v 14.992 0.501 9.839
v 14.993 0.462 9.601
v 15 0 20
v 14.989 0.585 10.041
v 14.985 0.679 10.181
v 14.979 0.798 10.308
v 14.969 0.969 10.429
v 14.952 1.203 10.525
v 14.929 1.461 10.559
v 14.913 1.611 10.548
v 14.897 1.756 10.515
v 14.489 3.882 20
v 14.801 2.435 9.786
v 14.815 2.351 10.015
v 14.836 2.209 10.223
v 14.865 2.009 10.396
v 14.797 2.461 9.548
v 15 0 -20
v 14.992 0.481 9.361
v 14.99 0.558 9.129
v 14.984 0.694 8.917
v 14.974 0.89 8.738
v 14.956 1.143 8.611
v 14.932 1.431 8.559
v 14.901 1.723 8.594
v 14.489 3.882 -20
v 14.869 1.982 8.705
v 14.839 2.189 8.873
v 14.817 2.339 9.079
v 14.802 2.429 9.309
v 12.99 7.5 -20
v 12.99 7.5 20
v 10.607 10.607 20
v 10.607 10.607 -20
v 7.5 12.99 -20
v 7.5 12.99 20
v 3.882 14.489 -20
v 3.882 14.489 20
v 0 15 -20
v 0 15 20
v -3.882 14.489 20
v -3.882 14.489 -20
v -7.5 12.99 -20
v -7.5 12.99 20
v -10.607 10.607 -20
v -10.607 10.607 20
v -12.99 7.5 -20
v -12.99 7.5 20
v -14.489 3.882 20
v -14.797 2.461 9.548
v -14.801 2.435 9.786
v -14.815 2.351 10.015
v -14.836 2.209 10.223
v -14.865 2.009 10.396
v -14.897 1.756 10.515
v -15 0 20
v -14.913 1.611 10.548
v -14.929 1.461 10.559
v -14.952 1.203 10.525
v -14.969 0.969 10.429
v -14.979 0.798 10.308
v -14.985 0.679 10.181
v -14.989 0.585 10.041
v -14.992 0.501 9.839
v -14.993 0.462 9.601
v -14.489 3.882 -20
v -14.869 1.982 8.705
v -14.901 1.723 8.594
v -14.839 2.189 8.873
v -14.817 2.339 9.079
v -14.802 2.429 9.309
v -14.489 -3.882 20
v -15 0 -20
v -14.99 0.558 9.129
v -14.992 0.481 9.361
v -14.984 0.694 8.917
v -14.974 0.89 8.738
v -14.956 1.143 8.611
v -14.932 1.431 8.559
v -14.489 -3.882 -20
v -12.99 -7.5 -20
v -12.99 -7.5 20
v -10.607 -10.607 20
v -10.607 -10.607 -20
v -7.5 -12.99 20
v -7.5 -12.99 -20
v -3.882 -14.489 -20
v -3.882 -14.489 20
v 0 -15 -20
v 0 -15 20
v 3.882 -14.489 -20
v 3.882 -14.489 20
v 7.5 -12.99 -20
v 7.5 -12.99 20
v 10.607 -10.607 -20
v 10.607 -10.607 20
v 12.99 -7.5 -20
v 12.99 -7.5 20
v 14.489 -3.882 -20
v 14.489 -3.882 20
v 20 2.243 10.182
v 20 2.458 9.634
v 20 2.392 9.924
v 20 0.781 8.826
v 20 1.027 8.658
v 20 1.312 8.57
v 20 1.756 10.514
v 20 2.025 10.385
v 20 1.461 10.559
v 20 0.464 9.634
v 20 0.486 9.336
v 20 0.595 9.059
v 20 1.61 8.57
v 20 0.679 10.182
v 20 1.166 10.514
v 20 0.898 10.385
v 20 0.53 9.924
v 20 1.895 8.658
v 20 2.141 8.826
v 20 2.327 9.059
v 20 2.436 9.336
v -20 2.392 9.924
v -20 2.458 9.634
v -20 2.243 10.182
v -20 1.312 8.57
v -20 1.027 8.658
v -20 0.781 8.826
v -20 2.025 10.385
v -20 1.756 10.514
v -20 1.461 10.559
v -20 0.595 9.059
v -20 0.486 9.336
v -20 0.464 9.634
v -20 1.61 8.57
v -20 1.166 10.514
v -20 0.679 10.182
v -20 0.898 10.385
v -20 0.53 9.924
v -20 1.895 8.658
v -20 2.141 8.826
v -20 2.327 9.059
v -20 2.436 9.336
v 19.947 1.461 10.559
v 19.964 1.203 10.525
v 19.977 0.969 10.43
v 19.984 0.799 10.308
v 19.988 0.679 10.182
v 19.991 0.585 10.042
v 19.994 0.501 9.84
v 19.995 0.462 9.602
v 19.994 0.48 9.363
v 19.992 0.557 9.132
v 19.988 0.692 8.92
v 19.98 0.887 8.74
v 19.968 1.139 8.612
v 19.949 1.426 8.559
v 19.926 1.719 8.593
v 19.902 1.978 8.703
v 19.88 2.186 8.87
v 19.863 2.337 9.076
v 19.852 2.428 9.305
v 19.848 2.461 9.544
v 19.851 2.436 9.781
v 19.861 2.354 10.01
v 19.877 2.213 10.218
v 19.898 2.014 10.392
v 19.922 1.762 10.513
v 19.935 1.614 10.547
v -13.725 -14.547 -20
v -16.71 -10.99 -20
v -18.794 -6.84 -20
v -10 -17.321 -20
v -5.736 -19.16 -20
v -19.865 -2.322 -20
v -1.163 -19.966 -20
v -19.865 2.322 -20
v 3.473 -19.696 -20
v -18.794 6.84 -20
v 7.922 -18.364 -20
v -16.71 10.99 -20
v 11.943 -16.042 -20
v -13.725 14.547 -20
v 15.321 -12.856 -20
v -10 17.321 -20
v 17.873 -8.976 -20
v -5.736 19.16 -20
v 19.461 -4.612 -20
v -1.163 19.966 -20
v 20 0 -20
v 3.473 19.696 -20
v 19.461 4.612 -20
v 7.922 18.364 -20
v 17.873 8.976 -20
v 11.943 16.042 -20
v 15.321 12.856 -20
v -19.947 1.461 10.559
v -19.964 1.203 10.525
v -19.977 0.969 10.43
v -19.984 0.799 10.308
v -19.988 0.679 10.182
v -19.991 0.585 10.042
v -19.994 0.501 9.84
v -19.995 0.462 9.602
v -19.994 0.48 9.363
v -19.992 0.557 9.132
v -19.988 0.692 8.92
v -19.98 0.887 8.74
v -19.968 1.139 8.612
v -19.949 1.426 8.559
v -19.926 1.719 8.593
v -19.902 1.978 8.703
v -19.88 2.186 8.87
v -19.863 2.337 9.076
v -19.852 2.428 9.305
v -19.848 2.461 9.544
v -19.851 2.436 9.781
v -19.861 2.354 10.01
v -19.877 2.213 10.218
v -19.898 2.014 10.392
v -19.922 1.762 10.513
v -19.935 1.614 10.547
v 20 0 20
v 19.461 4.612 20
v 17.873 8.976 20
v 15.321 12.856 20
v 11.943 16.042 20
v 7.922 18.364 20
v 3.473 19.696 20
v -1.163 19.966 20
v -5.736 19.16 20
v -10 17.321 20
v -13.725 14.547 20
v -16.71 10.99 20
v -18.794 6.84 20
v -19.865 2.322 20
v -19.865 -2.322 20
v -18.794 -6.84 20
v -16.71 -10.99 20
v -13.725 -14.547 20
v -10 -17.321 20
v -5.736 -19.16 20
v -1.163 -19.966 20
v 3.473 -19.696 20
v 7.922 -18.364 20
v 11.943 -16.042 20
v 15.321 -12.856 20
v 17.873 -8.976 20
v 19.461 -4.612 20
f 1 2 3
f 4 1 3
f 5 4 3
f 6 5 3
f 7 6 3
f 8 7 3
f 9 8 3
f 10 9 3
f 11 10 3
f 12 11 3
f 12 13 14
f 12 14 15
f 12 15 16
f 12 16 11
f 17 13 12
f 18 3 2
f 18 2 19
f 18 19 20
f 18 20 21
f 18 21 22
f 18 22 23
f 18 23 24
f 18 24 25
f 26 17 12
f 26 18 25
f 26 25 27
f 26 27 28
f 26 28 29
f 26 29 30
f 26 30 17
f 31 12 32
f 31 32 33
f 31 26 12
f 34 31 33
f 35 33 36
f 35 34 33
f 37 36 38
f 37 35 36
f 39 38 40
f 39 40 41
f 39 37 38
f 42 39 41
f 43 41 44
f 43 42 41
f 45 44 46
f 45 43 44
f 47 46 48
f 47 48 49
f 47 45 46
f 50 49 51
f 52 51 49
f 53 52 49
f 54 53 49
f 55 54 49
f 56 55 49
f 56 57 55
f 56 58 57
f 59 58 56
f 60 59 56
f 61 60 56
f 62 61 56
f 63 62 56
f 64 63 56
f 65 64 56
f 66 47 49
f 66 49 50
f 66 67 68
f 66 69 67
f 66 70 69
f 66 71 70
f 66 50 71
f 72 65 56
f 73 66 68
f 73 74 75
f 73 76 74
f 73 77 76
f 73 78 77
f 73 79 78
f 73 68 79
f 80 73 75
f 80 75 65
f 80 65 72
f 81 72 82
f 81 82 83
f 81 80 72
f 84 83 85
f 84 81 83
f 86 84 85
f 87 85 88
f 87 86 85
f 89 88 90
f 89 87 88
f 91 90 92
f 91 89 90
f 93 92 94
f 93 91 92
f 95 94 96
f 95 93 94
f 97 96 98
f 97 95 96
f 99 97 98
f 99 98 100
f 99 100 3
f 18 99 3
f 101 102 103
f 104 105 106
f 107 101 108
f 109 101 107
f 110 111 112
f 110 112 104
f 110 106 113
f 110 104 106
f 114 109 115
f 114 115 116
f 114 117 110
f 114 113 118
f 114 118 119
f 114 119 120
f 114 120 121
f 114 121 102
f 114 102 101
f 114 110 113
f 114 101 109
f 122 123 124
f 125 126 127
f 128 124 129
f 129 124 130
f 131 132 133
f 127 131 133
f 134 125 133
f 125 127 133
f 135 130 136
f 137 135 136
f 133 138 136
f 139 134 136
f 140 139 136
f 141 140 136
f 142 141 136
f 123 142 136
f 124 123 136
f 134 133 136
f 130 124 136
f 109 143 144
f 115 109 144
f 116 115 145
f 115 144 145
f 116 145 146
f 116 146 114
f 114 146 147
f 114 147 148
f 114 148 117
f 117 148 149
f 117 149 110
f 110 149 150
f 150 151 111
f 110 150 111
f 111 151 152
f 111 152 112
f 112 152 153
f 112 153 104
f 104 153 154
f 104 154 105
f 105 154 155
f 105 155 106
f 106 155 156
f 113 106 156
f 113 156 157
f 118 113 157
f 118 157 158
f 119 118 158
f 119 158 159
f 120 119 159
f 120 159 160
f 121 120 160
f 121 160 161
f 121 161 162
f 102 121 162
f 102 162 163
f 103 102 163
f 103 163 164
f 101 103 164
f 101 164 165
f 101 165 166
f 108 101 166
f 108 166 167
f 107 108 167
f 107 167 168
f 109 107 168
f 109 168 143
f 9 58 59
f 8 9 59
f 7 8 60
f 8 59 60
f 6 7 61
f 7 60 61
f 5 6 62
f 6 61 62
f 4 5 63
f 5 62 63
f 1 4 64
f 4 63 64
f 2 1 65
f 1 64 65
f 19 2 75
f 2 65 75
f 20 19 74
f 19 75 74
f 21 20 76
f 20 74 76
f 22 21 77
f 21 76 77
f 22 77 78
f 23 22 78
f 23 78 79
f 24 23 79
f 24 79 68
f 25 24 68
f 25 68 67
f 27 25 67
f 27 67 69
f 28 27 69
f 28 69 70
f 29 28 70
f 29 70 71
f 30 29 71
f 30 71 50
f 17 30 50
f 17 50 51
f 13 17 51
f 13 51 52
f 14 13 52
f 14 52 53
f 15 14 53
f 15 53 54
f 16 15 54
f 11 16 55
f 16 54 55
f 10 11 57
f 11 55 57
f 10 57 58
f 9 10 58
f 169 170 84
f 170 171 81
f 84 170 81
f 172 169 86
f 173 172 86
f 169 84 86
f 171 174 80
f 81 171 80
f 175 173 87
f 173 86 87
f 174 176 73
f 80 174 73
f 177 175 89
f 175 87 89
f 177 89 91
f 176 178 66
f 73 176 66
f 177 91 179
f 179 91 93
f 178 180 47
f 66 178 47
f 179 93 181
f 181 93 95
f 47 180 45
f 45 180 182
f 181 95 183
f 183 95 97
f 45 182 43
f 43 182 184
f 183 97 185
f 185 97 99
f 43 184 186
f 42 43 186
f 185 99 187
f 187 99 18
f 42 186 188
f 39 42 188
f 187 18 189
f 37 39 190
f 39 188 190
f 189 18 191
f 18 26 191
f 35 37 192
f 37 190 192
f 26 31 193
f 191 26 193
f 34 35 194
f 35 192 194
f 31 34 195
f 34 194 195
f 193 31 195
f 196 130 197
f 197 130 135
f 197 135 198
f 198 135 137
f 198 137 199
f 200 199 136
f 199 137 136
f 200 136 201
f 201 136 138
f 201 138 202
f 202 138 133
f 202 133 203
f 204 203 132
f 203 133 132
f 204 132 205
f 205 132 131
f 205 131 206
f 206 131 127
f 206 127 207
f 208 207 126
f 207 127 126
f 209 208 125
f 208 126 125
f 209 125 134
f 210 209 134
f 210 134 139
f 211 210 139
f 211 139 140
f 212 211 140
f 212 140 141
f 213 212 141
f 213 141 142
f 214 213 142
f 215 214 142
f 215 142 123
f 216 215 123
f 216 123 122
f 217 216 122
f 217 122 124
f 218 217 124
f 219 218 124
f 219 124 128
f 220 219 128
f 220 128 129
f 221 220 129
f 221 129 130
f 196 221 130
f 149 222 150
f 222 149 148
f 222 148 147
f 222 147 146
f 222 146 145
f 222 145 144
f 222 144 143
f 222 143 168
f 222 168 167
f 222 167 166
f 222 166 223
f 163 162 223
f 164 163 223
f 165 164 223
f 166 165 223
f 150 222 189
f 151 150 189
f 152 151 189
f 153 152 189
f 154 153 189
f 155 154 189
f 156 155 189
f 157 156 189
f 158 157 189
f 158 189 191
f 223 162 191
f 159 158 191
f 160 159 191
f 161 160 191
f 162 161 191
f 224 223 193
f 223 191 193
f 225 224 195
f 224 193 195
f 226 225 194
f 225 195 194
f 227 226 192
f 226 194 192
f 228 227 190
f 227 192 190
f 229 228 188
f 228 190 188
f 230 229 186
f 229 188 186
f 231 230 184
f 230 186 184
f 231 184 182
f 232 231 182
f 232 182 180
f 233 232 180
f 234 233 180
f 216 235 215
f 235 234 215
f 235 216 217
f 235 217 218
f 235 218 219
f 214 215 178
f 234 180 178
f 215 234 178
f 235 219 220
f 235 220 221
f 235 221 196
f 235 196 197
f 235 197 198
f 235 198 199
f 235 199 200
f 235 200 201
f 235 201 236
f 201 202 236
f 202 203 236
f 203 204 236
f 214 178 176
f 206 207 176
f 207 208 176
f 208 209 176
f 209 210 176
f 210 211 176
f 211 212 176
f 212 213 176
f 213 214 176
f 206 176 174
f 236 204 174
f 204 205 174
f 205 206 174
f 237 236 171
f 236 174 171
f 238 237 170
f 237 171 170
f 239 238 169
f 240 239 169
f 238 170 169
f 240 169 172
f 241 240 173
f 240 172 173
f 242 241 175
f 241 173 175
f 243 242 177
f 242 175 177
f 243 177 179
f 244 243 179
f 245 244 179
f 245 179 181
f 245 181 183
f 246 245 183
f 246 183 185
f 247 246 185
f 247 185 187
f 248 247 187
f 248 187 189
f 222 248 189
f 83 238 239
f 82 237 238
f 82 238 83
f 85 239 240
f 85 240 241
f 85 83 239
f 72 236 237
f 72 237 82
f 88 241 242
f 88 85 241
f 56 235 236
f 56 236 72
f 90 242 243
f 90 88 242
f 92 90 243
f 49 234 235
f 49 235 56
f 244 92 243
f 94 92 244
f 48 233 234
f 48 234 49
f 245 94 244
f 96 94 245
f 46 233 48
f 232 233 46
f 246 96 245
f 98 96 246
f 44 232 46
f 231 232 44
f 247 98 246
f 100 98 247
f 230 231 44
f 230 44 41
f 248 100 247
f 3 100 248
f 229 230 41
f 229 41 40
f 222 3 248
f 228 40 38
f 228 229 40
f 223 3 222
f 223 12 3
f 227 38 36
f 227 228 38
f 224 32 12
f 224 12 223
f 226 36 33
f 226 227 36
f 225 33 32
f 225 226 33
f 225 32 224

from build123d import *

# Parameters (mm, degrees)
BOSS_EXTRUDE1_DEPTH      = 20
BOSS_EXTRUDE1_DEPTH_BACK = 20
SKETCH1_R                = 20
SKETCH1_R_2              = 15
BOSS_EXTRUDE2_START      = -20
SKETCH2_R                = 1
BOSS_EXTRUDE2_DEPTH      = 40


with BuildPart() as part:
    # Sketch1 → Boss-Extrude1 (new, two sides: drawn at the far end of the back side and taken through both)
    with BuildSketch(Plane.XY.offset(-BOSS_EXTRUDE1_DEPTH_BACK)):
        Circle(SKETCH1_R)
        Circle(SKETCH1_R_2, mode=Mode.SUBTRACT)
    extrude(amount=BOSS_EXTRUDE1_DEPTH + BOSS_EXTRUDE1_DEPTH_BACK)

    # Sketch2 → Boss-Extrude2 (add)
    with BuildSketch(Plane(origin=(0, 0, 0), x_dir=(0, 0, -1), z_dir=(1, 0, 0)).offset(BOSS_EXTRUDE2_START)):
        with Locations(Location((-9.558885453, 1.461191935, 0), (0, 0, 180))):
            Circle(SKETCH2_R)
    extrude(amount=BOSS_EXTRUDE2_DEPTH)


solid = part.part
